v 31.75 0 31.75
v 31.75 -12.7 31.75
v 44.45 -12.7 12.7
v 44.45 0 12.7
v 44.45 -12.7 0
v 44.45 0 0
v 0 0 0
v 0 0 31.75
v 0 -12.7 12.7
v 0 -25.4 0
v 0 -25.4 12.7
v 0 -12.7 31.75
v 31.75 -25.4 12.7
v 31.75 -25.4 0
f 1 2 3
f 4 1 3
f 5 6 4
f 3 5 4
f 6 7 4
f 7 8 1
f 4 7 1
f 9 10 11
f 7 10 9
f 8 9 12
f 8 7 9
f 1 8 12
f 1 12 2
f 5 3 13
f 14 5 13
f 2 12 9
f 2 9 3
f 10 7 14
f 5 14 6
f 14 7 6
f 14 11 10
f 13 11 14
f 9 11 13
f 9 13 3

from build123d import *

# Parameters (mm, degrees)
F0_W     = 44.45
F0_H     = 31.75
F1_DEPTH = 25.4
F2_W     = 44.45
F2_H     = 19.05
F3_DEPTH = 12.7
F5_DEPTH = 25.4
F7_DEPTH = 25.4


with BuildPart() as f1:
    # F0 (on Front) → F1 (new body)
    with BuildSketch(Plane.XZ):
        with Locations((22.225, 15.875)):
            Rectangle(F0_W, F0_H)
    extrude(amount=F1_DEPTH)

    # F2 (on face) → F3 (cut)
    with BuildSketch(Plane.XZ.offset(25.4)):
        with Locations((22.225, 22.225)):
            Rectangle(F2_W, F2_H)
    extrude(amount=-F3_DEPTH, mode=Mode.SUBTRACT)

    # F4 (on face) → F5 (cut)
    with BuildSketch(Plane.XY.offset(12.7)):
        Polygon((44.45, -25.4), (44.45, -12.7), (31.75, -25.4), align=None)
    extrude(amount=-F5_DEPTH, mode=Mode.SUBTRACT)

    # F6 (on face) → F7 (cut)
    with BuildSketch(Plane.XZ.offset(12.7)):
        Polygon((31.75, 31.75), (44.45, 12.7), (44.45, 31.75), align=None)
    extrude(amount=-F7_DEPTH, mode=Mode.SUBTRACT)


solid = f1.part
